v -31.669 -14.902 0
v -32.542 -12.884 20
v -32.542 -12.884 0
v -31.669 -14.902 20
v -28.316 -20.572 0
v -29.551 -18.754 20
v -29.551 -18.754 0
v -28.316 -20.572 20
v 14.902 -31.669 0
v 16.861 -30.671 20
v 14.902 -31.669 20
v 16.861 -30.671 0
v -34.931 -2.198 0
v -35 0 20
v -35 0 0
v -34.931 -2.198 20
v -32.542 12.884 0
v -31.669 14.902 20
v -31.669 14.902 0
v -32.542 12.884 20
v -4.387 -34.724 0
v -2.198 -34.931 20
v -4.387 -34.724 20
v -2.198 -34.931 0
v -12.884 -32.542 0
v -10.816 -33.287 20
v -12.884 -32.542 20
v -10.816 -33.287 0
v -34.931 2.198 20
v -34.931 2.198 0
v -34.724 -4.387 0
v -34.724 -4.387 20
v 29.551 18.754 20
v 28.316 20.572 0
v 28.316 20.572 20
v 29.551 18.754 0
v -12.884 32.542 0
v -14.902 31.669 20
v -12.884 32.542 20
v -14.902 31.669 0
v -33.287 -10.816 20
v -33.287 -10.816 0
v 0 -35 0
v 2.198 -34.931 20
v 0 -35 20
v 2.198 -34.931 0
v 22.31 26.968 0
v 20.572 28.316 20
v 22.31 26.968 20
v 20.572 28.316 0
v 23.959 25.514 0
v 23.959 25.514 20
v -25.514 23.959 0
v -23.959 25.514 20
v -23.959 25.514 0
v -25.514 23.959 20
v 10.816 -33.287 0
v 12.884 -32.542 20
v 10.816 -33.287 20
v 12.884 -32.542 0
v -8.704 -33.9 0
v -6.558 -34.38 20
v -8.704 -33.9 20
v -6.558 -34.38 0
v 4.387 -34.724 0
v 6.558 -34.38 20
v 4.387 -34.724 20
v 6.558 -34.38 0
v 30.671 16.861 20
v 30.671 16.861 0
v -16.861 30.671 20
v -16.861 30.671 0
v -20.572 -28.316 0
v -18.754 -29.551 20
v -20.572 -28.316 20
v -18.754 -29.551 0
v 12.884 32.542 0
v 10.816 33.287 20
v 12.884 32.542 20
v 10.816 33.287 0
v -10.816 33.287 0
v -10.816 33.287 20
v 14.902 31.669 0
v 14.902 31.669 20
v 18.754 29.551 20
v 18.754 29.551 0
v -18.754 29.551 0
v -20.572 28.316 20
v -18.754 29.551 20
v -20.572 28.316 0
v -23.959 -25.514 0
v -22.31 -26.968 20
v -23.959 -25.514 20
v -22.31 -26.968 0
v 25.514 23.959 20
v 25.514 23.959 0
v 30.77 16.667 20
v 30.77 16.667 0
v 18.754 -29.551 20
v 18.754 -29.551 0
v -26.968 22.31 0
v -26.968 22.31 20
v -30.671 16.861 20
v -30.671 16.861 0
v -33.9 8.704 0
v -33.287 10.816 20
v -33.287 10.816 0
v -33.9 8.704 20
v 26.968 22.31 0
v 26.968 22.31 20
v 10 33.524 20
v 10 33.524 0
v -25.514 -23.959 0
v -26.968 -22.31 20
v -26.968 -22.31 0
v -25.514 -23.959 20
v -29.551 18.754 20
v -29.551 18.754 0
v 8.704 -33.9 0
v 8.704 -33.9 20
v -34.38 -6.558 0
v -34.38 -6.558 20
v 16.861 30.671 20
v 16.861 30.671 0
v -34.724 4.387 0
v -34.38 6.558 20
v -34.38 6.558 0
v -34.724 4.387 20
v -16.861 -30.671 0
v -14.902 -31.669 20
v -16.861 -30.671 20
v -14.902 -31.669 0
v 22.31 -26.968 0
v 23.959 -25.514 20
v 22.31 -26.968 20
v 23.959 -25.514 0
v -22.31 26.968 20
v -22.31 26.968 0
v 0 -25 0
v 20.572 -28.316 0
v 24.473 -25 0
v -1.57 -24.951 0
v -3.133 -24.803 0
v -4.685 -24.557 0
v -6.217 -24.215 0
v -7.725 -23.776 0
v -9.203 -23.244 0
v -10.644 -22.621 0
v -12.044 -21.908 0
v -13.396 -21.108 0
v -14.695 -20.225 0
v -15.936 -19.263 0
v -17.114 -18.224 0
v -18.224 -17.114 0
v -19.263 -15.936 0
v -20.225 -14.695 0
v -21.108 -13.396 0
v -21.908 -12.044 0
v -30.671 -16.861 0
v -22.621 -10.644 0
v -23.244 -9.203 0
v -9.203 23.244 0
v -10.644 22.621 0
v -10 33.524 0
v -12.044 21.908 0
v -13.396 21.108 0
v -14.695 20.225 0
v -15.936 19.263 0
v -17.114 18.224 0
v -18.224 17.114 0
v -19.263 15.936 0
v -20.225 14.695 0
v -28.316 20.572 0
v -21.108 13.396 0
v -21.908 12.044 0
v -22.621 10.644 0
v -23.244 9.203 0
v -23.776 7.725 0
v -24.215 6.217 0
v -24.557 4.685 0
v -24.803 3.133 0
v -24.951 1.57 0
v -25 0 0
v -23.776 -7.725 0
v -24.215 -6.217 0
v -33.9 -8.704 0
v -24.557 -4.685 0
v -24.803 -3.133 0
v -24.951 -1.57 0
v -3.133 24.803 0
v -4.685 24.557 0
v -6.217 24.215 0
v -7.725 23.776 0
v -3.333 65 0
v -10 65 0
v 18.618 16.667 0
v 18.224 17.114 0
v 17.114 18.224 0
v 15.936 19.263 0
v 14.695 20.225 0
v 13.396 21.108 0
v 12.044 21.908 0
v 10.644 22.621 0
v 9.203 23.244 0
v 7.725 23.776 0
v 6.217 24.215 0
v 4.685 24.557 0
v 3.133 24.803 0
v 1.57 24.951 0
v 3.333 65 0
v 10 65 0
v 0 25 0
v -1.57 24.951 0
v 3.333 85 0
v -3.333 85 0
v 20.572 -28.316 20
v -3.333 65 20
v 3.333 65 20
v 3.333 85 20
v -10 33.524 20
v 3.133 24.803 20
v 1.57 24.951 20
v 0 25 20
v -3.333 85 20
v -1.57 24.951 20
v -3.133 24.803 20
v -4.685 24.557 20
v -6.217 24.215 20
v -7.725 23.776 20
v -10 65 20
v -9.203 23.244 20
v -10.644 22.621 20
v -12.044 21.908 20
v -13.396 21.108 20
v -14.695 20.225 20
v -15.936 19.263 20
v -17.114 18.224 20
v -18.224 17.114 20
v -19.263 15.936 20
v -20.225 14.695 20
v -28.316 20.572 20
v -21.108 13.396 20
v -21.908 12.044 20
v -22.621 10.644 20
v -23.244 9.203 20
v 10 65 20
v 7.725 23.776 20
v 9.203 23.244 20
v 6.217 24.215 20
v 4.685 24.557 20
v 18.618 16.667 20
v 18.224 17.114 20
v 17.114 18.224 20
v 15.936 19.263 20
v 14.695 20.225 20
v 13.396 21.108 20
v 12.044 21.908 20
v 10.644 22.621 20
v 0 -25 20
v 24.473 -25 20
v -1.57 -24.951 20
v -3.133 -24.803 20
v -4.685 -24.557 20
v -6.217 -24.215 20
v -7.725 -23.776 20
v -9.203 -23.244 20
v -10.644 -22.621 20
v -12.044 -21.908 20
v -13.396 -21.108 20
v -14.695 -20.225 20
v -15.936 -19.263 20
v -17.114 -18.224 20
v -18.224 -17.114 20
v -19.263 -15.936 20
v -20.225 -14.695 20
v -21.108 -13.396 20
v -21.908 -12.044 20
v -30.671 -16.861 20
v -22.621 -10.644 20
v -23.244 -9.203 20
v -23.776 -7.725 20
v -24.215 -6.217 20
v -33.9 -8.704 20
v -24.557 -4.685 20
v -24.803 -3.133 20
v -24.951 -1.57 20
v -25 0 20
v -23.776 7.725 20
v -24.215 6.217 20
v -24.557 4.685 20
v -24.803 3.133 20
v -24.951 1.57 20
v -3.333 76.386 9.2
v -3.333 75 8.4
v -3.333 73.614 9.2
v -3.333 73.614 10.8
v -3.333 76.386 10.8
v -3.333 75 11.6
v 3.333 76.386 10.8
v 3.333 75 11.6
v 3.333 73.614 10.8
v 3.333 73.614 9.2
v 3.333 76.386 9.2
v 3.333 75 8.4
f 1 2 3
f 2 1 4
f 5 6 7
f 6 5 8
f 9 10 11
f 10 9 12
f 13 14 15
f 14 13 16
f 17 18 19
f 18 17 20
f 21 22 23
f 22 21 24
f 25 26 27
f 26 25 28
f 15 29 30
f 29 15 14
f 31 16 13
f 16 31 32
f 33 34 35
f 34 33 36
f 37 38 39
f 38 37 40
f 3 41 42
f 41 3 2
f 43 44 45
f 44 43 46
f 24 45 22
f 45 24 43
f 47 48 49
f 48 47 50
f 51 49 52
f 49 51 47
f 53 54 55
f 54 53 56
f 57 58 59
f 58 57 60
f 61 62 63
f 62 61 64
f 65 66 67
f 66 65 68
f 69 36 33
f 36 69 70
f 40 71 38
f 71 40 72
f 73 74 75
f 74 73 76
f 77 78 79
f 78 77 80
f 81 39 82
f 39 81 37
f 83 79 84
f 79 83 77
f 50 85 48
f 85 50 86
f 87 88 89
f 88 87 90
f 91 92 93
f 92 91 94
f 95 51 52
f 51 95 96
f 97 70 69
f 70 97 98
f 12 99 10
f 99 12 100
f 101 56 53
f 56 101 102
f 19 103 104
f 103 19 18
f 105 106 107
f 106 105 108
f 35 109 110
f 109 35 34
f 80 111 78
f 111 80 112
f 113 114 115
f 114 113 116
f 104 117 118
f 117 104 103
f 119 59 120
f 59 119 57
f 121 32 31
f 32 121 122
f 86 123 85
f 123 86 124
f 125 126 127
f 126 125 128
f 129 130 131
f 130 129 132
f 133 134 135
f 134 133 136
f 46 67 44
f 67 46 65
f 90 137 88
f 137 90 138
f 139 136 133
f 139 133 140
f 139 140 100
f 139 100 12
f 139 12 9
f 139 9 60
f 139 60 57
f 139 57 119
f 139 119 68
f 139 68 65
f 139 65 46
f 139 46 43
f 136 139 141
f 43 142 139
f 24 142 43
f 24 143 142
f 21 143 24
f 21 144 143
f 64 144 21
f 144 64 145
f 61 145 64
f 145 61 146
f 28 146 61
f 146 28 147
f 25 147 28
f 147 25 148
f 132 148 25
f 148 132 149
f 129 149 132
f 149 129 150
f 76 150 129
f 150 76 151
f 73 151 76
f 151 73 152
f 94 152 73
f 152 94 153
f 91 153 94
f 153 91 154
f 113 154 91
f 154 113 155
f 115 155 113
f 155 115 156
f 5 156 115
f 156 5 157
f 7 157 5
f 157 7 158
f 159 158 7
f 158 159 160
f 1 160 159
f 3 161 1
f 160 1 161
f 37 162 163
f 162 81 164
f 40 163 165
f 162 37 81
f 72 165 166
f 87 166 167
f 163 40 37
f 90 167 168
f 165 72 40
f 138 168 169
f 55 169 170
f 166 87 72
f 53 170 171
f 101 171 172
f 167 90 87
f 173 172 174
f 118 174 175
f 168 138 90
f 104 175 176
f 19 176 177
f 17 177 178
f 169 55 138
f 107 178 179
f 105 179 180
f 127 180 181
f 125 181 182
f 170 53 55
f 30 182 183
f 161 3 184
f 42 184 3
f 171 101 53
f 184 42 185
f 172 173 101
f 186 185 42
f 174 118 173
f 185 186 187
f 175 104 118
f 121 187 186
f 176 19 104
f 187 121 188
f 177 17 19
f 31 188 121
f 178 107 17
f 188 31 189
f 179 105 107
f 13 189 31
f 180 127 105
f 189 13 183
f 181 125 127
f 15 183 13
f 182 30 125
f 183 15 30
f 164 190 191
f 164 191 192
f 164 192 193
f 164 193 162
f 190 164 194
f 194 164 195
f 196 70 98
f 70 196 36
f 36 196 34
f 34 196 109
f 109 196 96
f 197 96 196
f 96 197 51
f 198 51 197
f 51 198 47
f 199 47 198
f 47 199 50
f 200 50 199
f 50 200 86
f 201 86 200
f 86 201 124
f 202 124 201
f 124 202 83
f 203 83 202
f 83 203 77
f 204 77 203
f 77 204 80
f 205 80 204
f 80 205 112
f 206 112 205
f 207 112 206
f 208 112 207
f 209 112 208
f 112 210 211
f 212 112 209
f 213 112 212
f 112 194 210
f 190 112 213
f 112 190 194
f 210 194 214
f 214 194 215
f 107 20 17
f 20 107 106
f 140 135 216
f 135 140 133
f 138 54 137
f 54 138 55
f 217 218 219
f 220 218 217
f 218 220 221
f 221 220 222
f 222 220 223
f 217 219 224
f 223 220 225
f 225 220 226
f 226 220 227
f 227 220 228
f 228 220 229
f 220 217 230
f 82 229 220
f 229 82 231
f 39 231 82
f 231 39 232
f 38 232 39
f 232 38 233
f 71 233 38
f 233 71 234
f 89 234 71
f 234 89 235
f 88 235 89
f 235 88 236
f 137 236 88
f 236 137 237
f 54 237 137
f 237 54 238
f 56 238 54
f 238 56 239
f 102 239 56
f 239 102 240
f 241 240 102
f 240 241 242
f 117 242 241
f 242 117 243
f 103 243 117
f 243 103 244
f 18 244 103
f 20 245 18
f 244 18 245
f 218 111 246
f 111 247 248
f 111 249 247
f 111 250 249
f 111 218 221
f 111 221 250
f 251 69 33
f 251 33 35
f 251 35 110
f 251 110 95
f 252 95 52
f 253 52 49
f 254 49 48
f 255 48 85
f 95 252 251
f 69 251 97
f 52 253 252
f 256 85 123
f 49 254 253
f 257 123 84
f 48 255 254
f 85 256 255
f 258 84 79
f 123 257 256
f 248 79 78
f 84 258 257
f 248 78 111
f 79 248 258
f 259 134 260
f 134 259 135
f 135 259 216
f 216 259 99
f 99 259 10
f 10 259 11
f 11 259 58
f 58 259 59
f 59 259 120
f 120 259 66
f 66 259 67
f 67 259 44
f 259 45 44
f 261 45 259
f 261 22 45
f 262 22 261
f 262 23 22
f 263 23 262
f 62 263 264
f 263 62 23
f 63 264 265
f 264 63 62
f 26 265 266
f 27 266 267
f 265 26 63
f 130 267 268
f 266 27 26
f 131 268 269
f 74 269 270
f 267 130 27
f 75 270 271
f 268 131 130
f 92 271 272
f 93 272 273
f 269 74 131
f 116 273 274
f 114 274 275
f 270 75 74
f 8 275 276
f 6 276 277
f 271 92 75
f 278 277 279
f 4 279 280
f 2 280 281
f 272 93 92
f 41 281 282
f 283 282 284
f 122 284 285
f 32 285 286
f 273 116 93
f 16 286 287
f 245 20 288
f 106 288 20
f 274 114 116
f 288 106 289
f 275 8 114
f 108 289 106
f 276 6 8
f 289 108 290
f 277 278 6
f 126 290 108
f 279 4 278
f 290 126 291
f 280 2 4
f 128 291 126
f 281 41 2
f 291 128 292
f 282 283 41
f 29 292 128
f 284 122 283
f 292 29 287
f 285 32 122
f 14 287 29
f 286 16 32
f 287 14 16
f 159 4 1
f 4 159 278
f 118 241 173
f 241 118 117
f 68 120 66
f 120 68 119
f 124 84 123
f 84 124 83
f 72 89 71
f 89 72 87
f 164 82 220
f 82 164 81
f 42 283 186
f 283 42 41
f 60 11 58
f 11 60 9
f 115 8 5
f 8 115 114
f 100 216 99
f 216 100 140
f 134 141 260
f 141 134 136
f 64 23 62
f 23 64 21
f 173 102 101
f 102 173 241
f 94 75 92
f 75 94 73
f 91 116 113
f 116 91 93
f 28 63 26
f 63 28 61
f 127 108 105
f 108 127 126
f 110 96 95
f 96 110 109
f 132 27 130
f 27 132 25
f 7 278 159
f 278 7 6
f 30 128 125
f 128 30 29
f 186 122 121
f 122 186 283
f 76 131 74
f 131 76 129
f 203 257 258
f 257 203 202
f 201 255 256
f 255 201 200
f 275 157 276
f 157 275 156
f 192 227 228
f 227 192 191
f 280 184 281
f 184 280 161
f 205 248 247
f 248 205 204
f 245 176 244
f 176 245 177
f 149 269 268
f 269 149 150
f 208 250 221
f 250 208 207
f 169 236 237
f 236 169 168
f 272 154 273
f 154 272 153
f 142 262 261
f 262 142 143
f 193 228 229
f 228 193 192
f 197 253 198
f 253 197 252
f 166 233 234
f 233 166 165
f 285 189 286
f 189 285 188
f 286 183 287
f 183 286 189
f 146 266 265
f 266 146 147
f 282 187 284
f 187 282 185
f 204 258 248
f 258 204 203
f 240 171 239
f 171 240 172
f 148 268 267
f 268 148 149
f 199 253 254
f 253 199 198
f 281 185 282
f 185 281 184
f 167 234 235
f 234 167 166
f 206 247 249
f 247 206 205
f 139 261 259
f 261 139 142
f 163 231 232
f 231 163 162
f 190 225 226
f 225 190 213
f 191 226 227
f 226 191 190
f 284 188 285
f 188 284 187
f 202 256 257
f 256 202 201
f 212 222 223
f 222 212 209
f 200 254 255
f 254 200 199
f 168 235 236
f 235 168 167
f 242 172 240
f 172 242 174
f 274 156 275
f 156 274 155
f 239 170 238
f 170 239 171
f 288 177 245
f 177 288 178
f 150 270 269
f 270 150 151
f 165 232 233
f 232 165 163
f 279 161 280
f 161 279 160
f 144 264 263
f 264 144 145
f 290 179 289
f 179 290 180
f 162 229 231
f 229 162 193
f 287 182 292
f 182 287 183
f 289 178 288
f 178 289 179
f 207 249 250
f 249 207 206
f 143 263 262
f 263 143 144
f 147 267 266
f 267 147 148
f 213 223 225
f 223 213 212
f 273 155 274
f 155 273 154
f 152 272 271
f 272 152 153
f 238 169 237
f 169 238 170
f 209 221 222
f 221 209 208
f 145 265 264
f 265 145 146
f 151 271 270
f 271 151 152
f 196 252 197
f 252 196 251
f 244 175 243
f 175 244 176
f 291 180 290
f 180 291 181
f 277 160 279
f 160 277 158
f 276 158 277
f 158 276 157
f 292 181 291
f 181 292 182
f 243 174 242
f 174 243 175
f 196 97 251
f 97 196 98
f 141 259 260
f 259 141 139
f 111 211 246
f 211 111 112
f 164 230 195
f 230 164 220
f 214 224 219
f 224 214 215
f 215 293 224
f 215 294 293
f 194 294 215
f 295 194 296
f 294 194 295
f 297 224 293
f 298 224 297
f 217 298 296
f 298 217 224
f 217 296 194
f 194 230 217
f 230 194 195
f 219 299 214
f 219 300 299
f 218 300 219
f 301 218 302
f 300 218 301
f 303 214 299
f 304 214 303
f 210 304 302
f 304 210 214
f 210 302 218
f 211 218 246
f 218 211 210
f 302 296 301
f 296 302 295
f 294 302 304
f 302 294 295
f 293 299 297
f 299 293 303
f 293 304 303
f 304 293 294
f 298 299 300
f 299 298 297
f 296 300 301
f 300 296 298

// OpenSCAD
// file: ../deps/nutsnbolts/data-access.scad
// Norm Nuts and Bolts - a OpenSCAD library
// Copyright (C) 2012  Johannes Kneer

// This program is free software: you can redistribute it and/or modify
// it under the terms of the GNU General Public License as published by
// the Free Software Foundation, either version 3 of the License, or
// (at your option) any later version.

// This program is distributed in the hope that it will be useful,
// but WITHOUT ANY WARRANTY; without even the implied warranty of
// MERCHANTABILITY or FITNESS FOR A PARTICULAR PURPOSE.  See the
// GNU General Public License for more details.

// You should have received a copy of the GNU General Public License
// along with this program.  If not, see <http://www.gnu.org/licenses/>.


// DATABASE ACCESS FUNCTIONS AND CONSTANTS



// == CONSTANTS ==

// screw table access keys
_NB_S_DESC            = 0;
_NB_S_FAMKEY			    = 1;
_NB_S_LENGTH          = 2;
_NB_S_NOTHREAD_LENGTH = 3;

_NB_F_DESC			      = 0;
_NB_F_OUTER_DIA       = 1;
_NB_F_INNER_DIA       = 2;
_NB_F_LEAD            = 3;
_NB_F_KEY             = 4;
_NB_F_KEY_DEPTH       = 5;
_NB_F_HEAD_HEIGHT     = 6;
_NB_F_HEAD_DIA        = 7;
_NB_F_NUT_KEY         = 8;
_NB_F_NUT_HEIGHT      = 9;
_NB_F_PITCH_FINE      = 10;
_NB_F_PITCH_MEDIUM    = 11;
_NB_F_PITCH_COARSE    = 12;


// == FUNCTIONS ==

// _get_screw("descriptor")   with descriptor = M8x25
//   find the line for a general object in the data matrix

function _get_screw(n) = data_screw[search([n], data_screw)[0]];
function _get_screw_fam(n) = data_screw_fam[search([_get_screw(n)[_NB_S_FAMKEY]], data_screw_fam)[0]];

function _get_fam(n) = data_screw_fam[search([n], data_screw_fam)[0]];


// _get_XXXXX("descriptor") functions
// find a single property in the database

function _get_desc(n)        = _get_screw(n)[_NB_S_DESC];
function _get_famkey(n)         = _get_screw(n)[_NB_S_FAMKEY];
function _get_length(n)      = _get_screw(n)[_NB_S_LENGTH];
function _get_nt_length(n)   = _get_screw(n)[_NB_S_NOTHREAD_LENGTH];

function _get_outer_dia(n)   = _get_screw_fam(n)[_NB_F_OUTER_DIA];
function _get_inner_dia(n)   = _get_screw_fam(n)[_NB_F_INNER_DIA];
function _get_lead(n)        = _get_screw_fam(n)[_NB_F_LEAD];
function _get_head_height(n) = _get_screw_fam(n)[_NB_F_HEAD_HEIGHT];
function _get_head_dia(n)    = _get_screw_fam(n)[_NB_F_HEAD_DIA];
function _get_nut_key(n)     = _get_screw_fam(n)[_NB_F_NUT_KEY];
function _get_nut_height(n)  = _get_screw_fam(n)[_NB_F_NUT_HEIGHT];
function _get_fine_pitch(n)  = _get_screw_fam(n)[_NB_F_PITCH_FINE];
function _get_medium_pitch(n)  = _get_screw_fam(n)[_NB_F_PITCH_MEDIUM];
function _get_coarse_pitch(n)  = _get_screw_fam(n)[_NB_F_PITCH_COARSE];
// file: polyScrewThread_r1.scad
/*
 *    polyScrewThread_r1.scad    by aubenc @ Thingiverse
 *
 * This script contains the library modules that can be used to generate
 * threaded rods, screws and nuts.
 *
 * http://www.thingiverse.com/thing:8796
 *
 * CC Public Domain
 */

module screw_thread(od,st,lf0,lt,rs,cs)
{
    or=od/2;
    ir=or-st/2*cos(lf0)/sin(lf0);
    pf=2*PI*or;
//    sn=floor(pf/rs);
    sn = 90;
    lfxy=360/sn;
    ttn=round(lt/st+1);
    zt=st/sn;

    intersection()
    {
        if (cs >= -1)
        {
           thread_shape(cs,lt,or,ir,sn,st);
        }

        full_thread(ttn,st,sn,zt,lfxy,or,ir);
    }
}

module hex_nut(df,hg,sth,clf,cod,crs)
{

    difference()
    {
        hex_head(hg,df);

        hex_countersink_ends(sth/2,cod,clf,crs,hg);

        screw_thread(cod,sth,clf,hg,crs,-2);
    }
}


module hex_screw(od,st,lf0,lt,rs,cs,df,hg,ntl,ntd)
{
    ntr=od/2-(st/2)*cos(lf0)/sin(lf0);

    union()
    {
        hex_head(hg,df);

        translate([0,0,hg])
        if ( ntl == 0 )
        {
            cylinder(h=0.01, r=ntr, center=true);
        }
        else
        {
            if ( ntd == -1 )
            {
                cylinder(h=ntl+0.01, r=ntr, $fn=floor(od*PI/rs), center=false);
            }
            else if ( ntd == 0 )
            {
                union()
                {
                    cylinder(h=ntl-st/2,
                             r=od/2, $fn=floor(od*PI/rs), center=false);

                    translate([0,0,ntl-st/2])
                    cylinder(h=st/2,
                             r1=od/2, r2=ntr, 
                             $fn=floor(od*PI/rs), center=false);
                }
            }
            else
            {
                cylinder(h=ntl, r=ntd/2, $fn=ntd*PI/rs, center=false);
            }
        }

        translate([0,0,ntl+hg]) screw_thread(od,st,lf0,lt,rs,cs);
    }
}

module hex_screw_0(od,st,lf0,lt,rs,cs,df,hg,ntl,ntd)
{
    ntr=od/2-(st/2)*cos(lf0)/sin(lf0);

    union()
    {
        hex_head_0(hg,df);

        translate([0,0,hg])
        if ( ntl == 0 )
        {
            cylinder(h=0.01, r=ntr, center=true);
        }
        else
        {
            if ( ntd == -1 )
            {
                cylinder(h=ntl+0.01, r=ntr, $fn=floor(od*PI/rs), center=false);
            }
            else if ( ntd == 0 )
            {
                union()
                {
                    cylinder(h=ntl-st/2,
                             r=od/2, $fn=floor(od*PI/rs), center=false);

                    translate([0,0,ntl-st/2])
                    cylinder(h=st/2,
                             r1=od/2, r2=ntr, 
                             $fn=floor(od*PI/rs), center=false);
                }
            }
            else
            {
                cylinder(h=ntl, r=ntd/2, $fn=ntd*PI/rs, center=false);
            }
        }

        translate([0,0,ntl+hg]) screw_thread(od,st,lf0,lt,rs,cs);
    }
}

module thread_shape(cs,lt,or,ir,sn,st)
{
    if ( cs == 0 )
    {
        cylinder(h=lt, r=or, $fn=sn, center=false);
    }
    else
    {
        union()
        {
            translate([0,0,st/2])
              cylinder(h=lt-st+0.005, r=or, $fn=sn, center=false);

            if ( cs == -1 || cs == 2 )
            {
                cylinder(h=st/2, r1=ir, r2=or, $fn=sn, center=false);
            }
            else
            {
                cylinder(h=st/2, r=or, $fn=sn, center=false);
            }

            translate([0,0,lt-st/2])
            if ( cs == 1 || cs == 2 )
            {
                  cylinder(h=st/2, r1=or, r2=ir, $fn=sn, center=false);
            }
            else
            {
                cylinder(h=st/2, r=or, $fn=sn, center=false);
            }
        }
    }
}

module full_thread(ttn,st,sn,zt,lfxy,or,ir)
{
  if(ir >= 0.2)
  {
    for(i=[0:ttn-1])
    {
        for(j=[0:sn-1])
			assign( pt = [	[0,                  0,                  i*st-st            ],
                        [ir*cos(j*lfxy),     ir*sin(j*lfxy),     i*st+j*zt-st       ],
                        [ir*cos((j+1)*lfxy), ir*sin((j+1)*lfxy), i*st+(j+1)*zt-st   ],
								[0,0,i*st],
                        [or*cos(j*lfxy),     or*sin(j*lfxy),     i*st+j*zt-st/2     ],
                        [or*cos((j+1)*lfxy), or*sin((j+1)*lfxy), i*st+(j+1)*zt-st/2 ],
                        [ir*cos(j*lfxy),     ir*sin(j*lfxy),     i*st+j*zt          ],
                        [ir*cos((j+1)*lfxy), ir*sin((j+1)*lfxy), i*st+(j+1)*zt      ],
                        [0,                  0,                  i*st+st            ]	])
        {
            polyhedron(points=pt,
              		  triangles=[	[1,0,3],[1,3,6],[6,3,8],[1,6,4],
											[0,1,2],[1,4,2],[2,4,5],[5,4,6],[5,6,7],[7,6,8],
											[7,8,3],[0,2,3],[3,2,7],[7,2,5]	]);
        }
    }
  }
  else
  {
    echo("Step Degrees too agresive, the thread will not be made!!");
    echo("Try to increase de value for the degrees and/or...");
    echo(" decrease the pitch value and/or...");
    echo(" increase the outer diameter value.");
  }
}

module hex_head(hg,df)
{
	rd0=df/2/sin(60);
	x0=0;	x1=df/2;	x2=x1+hg/2;
	y0=0;	y1=hg/2;	y2=hg;

	intersection()
	{
	   cylinder(h=hg, r=rd0, $fn=6, center=false);

		rotate_extrude(convexity=10, $fn=6*round(df*PI/6/0.5))
		polygon([ [x0,y0],[x1,y0],[x2,y1],[x1,y2],[x0,y2] ]);
	}
}

module hex_head_0(hg,df)
{
    cylinder(h=hg, r=df/2/sin(60), $fn=6, center=false);
}

module hex_countersink_ends(chg,cod,clf,crs,hg)
{
    translate([0,0,-0.1])
    cylinder(h=chg+0.01, 
             r1=cod/2, 
             r2=cod/2-(chg+0.1)*cos(clf)/sin(clf),
             $fn=floor(cod*PI/crs), center=false);

    translate([0,0,hg-chg+0.1])
    cylinder(h=chg+0.01, 
             r1=cod/2-(chg+0.1)*cos(clf)/sin(clf),
             r2=cod/2, 
             $fn=floor(cod*PI/crs), center=false);
}
// file: utils.scad
include <settings.scad>
include <polyScrewThread_r1.scad>

module screw(diameter) {
       hex_screw(diameter,4,55,100,1.5,2,24,8,0,0);
 
}

module big_screw() {
       screw(10);
}

module medium_screw() {
       screw(8);
}
// file: settings.scad
//// Parametrics settings

RingNumberOfTeeth=100;
DriverNumberOfTeeth=6;

ClampThickness=20;
ClampDiameter=50;
ClampLength=60;
ClampZone=20;

GrooveWidth=5;

fn=100;


RingThickness = 20; 
RingDiameter=140;
// main file
include <settings.scad>
include <utils.scad>

include <../deps/nutsnbolts/cyl_head_bolt.scad>

module clamp_screw() {
    rotate([0, 90, 0]) {
  translate([-ClampThickness/2, ClampLength + ClampDiameter/2 - ClampZone/2, -5]) {
            translate([0, 0, 22]) {
               hole_through(name="M3", l=20, cl=0.1, h=10, hcl=0.4); 
            }
            translate([0, 0, -2]) {
                nutcatch_parallel("M3", l=5);
            }
            }
        }
}

module clamp() {
   //     translate([0,-40, ClampThickness/2]) rotate([-90, 0, 0]) big_screw();
    
    difference(){
        cylinder(ClampThickness, ClampDiameter/2+ClampThickness/2, ClampDiameter/2+ClampThickness/2, $fn=fn);
        cylinder(ClampThickness, ClampDiameter/2, ClampDiameter/2, $fn=fn);
        translate([0, -ClampDiameter/2, 0]) cube([ClampDiameter, ClampDiameter/1.2, ClampThickness]);
        translate([0,-100, ClampThickness/2]) rotate([-90, 0, 0]) big_screw();
     } ;
     difference() {
         translate([-ClampThickness/2, ClampDiameter/2, 0]) {
            difference(){
                cube([ClampThickness, ClampLength, ClampThickness]);
                translate([0, ClampLength-ClampZone, 0])cube([ClampThickness/3, ClampLength, ClampThickness]);
                translate([ClampThickness - ClampThickness/3, ClampLength-ClampZone, 0]) cube([ClampThickness/3, ClampLength, ClampThickness]);
             
            }          
        }
       clamp_screw();
    }
	 
};

clamp();
